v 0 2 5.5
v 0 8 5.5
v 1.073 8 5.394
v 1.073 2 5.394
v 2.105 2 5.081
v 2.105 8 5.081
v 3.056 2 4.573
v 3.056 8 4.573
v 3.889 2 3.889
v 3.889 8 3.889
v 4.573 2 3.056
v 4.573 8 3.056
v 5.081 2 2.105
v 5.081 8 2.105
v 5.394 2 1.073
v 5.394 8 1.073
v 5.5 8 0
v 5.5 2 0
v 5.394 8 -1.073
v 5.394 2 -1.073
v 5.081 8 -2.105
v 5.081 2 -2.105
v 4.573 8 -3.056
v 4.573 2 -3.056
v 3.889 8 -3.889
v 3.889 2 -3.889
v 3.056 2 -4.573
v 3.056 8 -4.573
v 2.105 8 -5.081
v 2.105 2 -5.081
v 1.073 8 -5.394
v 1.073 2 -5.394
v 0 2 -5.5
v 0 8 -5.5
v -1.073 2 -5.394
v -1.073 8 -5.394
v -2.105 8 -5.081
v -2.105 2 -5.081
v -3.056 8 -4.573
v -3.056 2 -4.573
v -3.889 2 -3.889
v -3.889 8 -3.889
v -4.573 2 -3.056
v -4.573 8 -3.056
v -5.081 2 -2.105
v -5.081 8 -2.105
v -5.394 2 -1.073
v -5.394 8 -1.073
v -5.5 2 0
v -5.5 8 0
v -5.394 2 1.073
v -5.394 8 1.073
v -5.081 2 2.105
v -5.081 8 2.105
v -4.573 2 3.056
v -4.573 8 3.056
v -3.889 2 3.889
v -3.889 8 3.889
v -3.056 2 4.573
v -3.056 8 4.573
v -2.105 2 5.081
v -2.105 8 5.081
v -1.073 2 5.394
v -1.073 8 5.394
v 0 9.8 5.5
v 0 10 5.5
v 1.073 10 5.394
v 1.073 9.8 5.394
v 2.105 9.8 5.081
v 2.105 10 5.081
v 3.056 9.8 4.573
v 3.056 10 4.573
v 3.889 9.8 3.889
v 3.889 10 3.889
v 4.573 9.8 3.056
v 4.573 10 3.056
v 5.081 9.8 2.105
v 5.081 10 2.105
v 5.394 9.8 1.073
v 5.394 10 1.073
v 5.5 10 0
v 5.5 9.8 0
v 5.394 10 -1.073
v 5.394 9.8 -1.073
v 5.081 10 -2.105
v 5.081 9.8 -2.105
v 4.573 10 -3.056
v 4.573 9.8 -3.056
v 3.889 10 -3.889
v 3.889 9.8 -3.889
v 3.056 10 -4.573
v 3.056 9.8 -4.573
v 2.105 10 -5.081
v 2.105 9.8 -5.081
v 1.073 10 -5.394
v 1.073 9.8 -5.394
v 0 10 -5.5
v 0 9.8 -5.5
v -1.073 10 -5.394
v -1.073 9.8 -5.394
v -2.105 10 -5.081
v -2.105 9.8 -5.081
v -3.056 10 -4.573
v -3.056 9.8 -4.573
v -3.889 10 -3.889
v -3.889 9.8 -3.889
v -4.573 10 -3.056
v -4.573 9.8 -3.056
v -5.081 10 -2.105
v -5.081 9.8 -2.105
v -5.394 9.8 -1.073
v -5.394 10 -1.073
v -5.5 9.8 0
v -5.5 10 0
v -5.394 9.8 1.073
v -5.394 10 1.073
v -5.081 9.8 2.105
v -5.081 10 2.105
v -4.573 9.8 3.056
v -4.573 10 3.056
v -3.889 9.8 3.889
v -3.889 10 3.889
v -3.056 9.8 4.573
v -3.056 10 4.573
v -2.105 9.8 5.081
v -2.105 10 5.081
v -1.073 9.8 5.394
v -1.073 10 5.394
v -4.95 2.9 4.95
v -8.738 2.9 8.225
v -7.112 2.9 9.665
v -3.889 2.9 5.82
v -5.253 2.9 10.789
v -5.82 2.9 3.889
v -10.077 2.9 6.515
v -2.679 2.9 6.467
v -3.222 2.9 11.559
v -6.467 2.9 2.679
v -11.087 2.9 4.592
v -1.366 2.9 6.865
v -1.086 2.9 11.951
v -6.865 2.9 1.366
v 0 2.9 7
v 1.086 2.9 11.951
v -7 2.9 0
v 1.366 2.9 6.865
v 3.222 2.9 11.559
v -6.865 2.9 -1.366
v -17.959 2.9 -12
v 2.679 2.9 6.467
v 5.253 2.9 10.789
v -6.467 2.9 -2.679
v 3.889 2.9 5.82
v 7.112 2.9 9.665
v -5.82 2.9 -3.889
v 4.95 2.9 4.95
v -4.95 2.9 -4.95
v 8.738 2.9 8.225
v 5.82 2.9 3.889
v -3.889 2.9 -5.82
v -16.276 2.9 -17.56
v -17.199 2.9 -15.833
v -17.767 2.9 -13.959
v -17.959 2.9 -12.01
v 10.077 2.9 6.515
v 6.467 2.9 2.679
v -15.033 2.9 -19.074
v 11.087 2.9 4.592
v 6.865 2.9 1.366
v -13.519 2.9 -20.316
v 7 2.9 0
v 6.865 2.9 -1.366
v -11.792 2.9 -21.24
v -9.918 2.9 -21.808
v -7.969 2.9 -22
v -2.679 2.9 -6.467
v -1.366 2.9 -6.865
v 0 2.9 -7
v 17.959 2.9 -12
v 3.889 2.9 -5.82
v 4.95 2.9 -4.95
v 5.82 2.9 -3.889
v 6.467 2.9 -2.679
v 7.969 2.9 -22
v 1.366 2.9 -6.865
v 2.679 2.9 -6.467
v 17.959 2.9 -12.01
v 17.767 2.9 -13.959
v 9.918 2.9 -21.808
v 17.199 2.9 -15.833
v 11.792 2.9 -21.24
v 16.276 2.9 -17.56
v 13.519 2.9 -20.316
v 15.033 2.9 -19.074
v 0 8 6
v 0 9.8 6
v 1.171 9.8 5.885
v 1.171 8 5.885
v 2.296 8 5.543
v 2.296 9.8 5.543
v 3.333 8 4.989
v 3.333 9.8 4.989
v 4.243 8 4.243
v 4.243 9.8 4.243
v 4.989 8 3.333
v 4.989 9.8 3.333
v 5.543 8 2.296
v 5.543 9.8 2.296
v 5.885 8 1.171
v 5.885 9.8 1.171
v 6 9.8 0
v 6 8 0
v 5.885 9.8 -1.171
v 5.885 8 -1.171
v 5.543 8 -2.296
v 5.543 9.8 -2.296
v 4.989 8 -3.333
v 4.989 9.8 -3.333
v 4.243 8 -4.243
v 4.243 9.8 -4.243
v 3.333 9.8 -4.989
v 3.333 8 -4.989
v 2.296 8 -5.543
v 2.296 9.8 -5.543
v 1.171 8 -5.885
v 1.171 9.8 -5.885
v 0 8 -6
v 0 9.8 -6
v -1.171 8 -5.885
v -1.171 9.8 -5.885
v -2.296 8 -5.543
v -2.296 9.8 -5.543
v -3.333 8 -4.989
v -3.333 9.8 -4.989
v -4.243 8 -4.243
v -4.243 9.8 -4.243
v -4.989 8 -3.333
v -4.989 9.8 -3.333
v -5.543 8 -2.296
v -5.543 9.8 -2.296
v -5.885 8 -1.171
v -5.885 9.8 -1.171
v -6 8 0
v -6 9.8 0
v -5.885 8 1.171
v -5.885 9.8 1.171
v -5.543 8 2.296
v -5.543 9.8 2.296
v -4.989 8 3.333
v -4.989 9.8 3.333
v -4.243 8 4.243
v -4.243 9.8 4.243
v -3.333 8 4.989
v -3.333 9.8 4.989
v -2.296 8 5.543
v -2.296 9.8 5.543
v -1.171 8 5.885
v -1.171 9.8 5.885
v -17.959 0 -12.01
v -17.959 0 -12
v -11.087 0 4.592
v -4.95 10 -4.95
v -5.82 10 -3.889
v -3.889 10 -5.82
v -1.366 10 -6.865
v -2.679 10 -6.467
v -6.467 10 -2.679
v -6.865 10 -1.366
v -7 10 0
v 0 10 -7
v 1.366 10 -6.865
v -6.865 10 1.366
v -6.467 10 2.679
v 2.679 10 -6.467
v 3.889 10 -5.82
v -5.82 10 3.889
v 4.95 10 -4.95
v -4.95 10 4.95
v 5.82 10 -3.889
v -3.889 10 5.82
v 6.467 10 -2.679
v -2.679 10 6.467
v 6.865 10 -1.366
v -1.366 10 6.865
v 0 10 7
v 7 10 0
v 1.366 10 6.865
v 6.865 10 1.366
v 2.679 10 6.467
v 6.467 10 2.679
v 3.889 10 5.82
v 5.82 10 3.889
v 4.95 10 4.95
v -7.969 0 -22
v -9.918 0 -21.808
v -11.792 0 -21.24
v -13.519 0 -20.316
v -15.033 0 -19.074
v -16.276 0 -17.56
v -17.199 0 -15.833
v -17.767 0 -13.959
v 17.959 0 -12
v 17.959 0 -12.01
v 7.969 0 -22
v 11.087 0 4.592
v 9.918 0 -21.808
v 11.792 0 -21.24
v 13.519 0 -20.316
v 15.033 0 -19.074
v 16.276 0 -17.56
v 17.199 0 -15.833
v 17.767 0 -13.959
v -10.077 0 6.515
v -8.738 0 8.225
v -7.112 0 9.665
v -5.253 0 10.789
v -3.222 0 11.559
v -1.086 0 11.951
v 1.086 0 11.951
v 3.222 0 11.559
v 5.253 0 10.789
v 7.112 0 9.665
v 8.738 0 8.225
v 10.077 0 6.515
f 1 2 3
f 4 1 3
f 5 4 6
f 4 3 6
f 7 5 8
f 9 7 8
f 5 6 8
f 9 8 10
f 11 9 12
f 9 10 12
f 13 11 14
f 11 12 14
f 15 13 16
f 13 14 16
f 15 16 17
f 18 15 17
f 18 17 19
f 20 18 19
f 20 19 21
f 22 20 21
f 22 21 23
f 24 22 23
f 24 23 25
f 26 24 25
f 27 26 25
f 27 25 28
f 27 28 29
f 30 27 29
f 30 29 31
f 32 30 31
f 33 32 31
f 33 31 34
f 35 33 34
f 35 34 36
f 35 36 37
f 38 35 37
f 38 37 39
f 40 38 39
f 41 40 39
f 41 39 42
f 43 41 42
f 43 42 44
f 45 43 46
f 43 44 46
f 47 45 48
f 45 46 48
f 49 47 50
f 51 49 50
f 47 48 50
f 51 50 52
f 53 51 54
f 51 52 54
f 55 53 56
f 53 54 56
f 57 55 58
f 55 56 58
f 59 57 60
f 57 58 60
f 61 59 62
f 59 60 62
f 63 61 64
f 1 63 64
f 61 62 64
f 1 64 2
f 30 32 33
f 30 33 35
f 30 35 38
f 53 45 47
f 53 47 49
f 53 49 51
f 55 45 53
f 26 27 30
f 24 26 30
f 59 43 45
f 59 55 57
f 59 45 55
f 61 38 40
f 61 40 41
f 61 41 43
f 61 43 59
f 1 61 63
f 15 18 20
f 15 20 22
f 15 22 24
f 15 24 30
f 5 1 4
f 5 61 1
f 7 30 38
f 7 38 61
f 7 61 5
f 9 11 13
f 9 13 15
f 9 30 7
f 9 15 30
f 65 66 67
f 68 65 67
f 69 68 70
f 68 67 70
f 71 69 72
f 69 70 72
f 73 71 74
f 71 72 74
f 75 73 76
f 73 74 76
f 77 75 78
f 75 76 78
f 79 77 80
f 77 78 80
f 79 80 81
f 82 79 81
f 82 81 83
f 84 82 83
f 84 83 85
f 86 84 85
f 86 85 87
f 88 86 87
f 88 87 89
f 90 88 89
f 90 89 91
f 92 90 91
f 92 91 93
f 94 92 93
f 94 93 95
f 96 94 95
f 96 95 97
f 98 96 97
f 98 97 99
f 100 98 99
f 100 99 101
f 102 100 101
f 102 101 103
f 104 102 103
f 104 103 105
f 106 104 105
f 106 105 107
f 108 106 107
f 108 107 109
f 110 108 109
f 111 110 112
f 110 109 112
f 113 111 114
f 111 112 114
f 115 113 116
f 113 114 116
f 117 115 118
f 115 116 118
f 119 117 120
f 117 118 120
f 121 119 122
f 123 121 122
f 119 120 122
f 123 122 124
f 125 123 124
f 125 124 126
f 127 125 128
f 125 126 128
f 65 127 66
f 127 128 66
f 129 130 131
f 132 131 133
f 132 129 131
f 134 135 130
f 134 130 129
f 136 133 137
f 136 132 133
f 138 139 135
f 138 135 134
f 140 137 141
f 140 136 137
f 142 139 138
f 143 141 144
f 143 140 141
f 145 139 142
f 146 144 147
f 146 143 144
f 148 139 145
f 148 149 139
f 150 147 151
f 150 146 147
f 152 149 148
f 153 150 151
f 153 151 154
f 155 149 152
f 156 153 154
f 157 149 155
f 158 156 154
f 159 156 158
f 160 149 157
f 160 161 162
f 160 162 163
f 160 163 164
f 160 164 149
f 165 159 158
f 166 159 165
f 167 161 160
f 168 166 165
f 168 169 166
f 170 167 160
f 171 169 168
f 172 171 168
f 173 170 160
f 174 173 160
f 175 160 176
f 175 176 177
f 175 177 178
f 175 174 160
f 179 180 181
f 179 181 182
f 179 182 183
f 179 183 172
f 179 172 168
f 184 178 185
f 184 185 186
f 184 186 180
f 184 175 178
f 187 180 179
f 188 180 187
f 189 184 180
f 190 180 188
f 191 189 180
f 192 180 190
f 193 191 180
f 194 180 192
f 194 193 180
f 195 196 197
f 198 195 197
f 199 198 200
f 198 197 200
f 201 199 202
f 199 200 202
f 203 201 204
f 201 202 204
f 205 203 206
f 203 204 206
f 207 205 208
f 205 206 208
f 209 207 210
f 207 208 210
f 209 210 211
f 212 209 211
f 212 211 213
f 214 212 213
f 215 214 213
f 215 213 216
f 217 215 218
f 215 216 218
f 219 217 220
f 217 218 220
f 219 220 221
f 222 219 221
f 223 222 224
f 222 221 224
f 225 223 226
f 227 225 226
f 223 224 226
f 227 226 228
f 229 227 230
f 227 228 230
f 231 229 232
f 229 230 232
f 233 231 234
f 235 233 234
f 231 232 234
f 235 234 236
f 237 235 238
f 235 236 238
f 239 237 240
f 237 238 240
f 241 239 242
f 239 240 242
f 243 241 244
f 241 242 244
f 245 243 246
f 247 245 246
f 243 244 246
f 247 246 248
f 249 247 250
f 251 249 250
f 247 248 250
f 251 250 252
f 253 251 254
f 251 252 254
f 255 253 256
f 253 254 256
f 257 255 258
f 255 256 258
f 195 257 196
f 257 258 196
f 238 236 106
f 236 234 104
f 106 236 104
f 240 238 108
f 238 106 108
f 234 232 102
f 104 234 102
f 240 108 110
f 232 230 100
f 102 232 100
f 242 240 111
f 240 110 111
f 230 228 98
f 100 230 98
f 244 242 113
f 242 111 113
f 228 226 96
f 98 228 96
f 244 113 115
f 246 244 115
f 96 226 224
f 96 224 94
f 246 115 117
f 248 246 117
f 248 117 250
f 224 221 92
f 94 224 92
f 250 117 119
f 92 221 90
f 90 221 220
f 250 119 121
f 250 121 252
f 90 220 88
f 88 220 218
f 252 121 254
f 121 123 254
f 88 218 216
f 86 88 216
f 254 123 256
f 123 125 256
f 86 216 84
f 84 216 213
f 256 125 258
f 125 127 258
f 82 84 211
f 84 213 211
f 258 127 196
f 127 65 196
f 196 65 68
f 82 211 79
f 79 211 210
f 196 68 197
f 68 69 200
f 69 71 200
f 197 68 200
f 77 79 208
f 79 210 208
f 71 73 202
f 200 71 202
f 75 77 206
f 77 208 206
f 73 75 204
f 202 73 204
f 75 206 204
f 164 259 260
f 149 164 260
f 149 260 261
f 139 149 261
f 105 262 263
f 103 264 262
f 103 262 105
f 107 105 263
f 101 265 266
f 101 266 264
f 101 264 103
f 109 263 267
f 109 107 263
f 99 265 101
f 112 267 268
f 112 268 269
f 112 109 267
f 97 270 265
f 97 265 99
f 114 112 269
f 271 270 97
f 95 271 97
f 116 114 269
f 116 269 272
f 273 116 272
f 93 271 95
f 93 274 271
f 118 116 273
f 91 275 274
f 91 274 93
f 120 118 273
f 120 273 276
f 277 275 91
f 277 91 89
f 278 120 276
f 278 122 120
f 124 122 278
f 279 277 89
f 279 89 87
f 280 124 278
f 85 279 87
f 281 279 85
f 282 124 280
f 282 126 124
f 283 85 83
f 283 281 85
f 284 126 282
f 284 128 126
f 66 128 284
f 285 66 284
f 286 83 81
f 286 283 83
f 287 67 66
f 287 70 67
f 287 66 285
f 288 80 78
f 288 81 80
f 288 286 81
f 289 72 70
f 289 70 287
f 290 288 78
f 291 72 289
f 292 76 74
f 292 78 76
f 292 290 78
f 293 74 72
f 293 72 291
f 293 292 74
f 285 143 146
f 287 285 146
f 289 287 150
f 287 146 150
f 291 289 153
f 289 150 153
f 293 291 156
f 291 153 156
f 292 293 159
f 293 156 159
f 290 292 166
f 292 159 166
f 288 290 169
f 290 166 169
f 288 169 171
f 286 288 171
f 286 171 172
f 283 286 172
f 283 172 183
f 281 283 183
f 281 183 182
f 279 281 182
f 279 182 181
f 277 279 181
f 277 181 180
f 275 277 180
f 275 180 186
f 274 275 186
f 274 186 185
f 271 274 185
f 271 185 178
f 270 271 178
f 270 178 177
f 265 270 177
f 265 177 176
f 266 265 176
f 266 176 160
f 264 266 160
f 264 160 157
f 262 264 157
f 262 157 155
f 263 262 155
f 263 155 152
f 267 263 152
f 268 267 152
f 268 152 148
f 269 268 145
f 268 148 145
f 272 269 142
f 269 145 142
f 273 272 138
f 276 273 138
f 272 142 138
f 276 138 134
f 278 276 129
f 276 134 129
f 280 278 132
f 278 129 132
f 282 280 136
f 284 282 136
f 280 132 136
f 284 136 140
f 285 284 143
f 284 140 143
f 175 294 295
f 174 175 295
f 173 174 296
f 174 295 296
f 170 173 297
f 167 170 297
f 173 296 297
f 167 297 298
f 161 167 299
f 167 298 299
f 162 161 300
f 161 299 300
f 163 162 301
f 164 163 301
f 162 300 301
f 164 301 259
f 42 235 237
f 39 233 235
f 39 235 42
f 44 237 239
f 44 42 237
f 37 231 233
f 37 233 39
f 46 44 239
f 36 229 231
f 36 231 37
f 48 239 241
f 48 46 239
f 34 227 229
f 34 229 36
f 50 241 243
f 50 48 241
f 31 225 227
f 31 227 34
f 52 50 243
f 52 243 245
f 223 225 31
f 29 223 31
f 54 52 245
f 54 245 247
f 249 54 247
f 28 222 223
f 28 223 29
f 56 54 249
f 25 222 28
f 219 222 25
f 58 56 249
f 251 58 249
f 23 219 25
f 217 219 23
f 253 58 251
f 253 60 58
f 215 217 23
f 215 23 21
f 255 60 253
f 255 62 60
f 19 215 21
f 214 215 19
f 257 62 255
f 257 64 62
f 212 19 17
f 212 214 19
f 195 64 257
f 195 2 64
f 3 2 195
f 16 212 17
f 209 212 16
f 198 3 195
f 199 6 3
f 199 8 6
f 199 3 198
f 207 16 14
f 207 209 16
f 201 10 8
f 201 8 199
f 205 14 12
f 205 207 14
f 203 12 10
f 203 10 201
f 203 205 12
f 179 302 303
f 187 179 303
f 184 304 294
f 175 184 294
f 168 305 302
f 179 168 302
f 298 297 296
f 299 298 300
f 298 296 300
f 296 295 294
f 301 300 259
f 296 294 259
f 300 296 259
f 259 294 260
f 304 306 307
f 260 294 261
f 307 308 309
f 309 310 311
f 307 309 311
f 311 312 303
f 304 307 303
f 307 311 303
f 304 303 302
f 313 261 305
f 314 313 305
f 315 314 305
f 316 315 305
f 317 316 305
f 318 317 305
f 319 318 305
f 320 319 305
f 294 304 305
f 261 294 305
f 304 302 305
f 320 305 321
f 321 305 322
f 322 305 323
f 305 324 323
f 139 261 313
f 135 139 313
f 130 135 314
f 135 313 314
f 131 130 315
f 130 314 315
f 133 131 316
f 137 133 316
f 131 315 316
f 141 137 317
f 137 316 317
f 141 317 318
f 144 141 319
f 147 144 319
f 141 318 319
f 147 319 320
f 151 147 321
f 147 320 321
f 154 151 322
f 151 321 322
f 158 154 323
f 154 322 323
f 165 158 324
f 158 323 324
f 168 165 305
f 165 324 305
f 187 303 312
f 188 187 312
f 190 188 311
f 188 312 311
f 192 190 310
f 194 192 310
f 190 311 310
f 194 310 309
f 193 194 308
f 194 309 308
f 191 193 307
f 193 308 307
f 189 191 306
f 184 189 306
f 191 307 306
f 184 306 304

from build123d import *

# Parameters (mm, degrees)
BOSS_EXTRUDE1_DEPTH = 2.9
SKETCH1_3_R         = 7
BOSS_EXTRUDE2_DEPTH = 10
SKETCH7_R           = 5.5
CUT_EXTRUDE10_DEPTH = 8
SKETCH8_R           = 6
SKETCH8_R_2         = 5.5
CUT_EXTRUDE11_DEPTH = 1.8


with BuildPart() as part:
    # Sketch1 → Boss-Extrude1 (new body)
    with BuildSketch(Plane(origin=(0, 0, 0), x_dir=(1, 0, 0), z_dir=(0, 1, 0))):
        with BuildLine():
            Line((-17.959269152, 12), (-11.086554257, -4.59220151))
            ThreePointArc((-11.086554257, -4.59220151), (1.96e-07, -12), (11.086554407, -4.592201147))
            Line((11.086554407, -4.592201147), (17.959269152, 12))
            Line((17.959269152, 12), (17.959269152, 12.01))
            ThreePointArc((17.959269152, 12.01), (15.033265896, 19.073996744), (7.969269152, 22))
            Line((7.969269152, 22), (-7.969269152, 22))
            ThreePointArc((-7.969269152, 22), (-15.033265896, 19.073996744), (-17.959269152, 12.01))
            Line((-17.959269152, 12.01), (-17.959269152, 12))
        make_face()
    extrude(amount=BOSS_EXTRUDE1_DEPTH)

    # Sketch1<3> → Boss-Extrude2 (add)
    with BuildSketch(Plane(origin=(0, 0, 0), x_dir=(1, 0, 0), z_dir=(0, 1, 0))):
        Circle(SKETCH1_3_R)
    extrude(amount=BOSS_EXTRUDE2_DEPTH)

    # Sketch7 → Cut-Extrude10 (cut)
    with BuildSketch(Plane(origin=(0, 10, 0), x_dir=(1, 0, 0), z_dir=(0, 1, 0))):
        Circle(SKETCH7_R)
    extrude(amount=-CUT_EXTRUDE10_DEPTH, mode=Mode.SUBTRACT)

    # Sketch8 → Cut-Extrude11 (cut)
    with BuildSketch(Plane(origin=(0, 9.8, 0), x_dir=(1, 0, 0), z_dir=(0, 1, 0))):
        Circle(SKETCH8_R)
        Circle(SKETCH8_R_2, mode=Mode.SUBTRACT)
    extrude(amount=-CUT_EXTRUDE11_DEPTH, mode=Mode.SUBTRACT)


solid = part.part
